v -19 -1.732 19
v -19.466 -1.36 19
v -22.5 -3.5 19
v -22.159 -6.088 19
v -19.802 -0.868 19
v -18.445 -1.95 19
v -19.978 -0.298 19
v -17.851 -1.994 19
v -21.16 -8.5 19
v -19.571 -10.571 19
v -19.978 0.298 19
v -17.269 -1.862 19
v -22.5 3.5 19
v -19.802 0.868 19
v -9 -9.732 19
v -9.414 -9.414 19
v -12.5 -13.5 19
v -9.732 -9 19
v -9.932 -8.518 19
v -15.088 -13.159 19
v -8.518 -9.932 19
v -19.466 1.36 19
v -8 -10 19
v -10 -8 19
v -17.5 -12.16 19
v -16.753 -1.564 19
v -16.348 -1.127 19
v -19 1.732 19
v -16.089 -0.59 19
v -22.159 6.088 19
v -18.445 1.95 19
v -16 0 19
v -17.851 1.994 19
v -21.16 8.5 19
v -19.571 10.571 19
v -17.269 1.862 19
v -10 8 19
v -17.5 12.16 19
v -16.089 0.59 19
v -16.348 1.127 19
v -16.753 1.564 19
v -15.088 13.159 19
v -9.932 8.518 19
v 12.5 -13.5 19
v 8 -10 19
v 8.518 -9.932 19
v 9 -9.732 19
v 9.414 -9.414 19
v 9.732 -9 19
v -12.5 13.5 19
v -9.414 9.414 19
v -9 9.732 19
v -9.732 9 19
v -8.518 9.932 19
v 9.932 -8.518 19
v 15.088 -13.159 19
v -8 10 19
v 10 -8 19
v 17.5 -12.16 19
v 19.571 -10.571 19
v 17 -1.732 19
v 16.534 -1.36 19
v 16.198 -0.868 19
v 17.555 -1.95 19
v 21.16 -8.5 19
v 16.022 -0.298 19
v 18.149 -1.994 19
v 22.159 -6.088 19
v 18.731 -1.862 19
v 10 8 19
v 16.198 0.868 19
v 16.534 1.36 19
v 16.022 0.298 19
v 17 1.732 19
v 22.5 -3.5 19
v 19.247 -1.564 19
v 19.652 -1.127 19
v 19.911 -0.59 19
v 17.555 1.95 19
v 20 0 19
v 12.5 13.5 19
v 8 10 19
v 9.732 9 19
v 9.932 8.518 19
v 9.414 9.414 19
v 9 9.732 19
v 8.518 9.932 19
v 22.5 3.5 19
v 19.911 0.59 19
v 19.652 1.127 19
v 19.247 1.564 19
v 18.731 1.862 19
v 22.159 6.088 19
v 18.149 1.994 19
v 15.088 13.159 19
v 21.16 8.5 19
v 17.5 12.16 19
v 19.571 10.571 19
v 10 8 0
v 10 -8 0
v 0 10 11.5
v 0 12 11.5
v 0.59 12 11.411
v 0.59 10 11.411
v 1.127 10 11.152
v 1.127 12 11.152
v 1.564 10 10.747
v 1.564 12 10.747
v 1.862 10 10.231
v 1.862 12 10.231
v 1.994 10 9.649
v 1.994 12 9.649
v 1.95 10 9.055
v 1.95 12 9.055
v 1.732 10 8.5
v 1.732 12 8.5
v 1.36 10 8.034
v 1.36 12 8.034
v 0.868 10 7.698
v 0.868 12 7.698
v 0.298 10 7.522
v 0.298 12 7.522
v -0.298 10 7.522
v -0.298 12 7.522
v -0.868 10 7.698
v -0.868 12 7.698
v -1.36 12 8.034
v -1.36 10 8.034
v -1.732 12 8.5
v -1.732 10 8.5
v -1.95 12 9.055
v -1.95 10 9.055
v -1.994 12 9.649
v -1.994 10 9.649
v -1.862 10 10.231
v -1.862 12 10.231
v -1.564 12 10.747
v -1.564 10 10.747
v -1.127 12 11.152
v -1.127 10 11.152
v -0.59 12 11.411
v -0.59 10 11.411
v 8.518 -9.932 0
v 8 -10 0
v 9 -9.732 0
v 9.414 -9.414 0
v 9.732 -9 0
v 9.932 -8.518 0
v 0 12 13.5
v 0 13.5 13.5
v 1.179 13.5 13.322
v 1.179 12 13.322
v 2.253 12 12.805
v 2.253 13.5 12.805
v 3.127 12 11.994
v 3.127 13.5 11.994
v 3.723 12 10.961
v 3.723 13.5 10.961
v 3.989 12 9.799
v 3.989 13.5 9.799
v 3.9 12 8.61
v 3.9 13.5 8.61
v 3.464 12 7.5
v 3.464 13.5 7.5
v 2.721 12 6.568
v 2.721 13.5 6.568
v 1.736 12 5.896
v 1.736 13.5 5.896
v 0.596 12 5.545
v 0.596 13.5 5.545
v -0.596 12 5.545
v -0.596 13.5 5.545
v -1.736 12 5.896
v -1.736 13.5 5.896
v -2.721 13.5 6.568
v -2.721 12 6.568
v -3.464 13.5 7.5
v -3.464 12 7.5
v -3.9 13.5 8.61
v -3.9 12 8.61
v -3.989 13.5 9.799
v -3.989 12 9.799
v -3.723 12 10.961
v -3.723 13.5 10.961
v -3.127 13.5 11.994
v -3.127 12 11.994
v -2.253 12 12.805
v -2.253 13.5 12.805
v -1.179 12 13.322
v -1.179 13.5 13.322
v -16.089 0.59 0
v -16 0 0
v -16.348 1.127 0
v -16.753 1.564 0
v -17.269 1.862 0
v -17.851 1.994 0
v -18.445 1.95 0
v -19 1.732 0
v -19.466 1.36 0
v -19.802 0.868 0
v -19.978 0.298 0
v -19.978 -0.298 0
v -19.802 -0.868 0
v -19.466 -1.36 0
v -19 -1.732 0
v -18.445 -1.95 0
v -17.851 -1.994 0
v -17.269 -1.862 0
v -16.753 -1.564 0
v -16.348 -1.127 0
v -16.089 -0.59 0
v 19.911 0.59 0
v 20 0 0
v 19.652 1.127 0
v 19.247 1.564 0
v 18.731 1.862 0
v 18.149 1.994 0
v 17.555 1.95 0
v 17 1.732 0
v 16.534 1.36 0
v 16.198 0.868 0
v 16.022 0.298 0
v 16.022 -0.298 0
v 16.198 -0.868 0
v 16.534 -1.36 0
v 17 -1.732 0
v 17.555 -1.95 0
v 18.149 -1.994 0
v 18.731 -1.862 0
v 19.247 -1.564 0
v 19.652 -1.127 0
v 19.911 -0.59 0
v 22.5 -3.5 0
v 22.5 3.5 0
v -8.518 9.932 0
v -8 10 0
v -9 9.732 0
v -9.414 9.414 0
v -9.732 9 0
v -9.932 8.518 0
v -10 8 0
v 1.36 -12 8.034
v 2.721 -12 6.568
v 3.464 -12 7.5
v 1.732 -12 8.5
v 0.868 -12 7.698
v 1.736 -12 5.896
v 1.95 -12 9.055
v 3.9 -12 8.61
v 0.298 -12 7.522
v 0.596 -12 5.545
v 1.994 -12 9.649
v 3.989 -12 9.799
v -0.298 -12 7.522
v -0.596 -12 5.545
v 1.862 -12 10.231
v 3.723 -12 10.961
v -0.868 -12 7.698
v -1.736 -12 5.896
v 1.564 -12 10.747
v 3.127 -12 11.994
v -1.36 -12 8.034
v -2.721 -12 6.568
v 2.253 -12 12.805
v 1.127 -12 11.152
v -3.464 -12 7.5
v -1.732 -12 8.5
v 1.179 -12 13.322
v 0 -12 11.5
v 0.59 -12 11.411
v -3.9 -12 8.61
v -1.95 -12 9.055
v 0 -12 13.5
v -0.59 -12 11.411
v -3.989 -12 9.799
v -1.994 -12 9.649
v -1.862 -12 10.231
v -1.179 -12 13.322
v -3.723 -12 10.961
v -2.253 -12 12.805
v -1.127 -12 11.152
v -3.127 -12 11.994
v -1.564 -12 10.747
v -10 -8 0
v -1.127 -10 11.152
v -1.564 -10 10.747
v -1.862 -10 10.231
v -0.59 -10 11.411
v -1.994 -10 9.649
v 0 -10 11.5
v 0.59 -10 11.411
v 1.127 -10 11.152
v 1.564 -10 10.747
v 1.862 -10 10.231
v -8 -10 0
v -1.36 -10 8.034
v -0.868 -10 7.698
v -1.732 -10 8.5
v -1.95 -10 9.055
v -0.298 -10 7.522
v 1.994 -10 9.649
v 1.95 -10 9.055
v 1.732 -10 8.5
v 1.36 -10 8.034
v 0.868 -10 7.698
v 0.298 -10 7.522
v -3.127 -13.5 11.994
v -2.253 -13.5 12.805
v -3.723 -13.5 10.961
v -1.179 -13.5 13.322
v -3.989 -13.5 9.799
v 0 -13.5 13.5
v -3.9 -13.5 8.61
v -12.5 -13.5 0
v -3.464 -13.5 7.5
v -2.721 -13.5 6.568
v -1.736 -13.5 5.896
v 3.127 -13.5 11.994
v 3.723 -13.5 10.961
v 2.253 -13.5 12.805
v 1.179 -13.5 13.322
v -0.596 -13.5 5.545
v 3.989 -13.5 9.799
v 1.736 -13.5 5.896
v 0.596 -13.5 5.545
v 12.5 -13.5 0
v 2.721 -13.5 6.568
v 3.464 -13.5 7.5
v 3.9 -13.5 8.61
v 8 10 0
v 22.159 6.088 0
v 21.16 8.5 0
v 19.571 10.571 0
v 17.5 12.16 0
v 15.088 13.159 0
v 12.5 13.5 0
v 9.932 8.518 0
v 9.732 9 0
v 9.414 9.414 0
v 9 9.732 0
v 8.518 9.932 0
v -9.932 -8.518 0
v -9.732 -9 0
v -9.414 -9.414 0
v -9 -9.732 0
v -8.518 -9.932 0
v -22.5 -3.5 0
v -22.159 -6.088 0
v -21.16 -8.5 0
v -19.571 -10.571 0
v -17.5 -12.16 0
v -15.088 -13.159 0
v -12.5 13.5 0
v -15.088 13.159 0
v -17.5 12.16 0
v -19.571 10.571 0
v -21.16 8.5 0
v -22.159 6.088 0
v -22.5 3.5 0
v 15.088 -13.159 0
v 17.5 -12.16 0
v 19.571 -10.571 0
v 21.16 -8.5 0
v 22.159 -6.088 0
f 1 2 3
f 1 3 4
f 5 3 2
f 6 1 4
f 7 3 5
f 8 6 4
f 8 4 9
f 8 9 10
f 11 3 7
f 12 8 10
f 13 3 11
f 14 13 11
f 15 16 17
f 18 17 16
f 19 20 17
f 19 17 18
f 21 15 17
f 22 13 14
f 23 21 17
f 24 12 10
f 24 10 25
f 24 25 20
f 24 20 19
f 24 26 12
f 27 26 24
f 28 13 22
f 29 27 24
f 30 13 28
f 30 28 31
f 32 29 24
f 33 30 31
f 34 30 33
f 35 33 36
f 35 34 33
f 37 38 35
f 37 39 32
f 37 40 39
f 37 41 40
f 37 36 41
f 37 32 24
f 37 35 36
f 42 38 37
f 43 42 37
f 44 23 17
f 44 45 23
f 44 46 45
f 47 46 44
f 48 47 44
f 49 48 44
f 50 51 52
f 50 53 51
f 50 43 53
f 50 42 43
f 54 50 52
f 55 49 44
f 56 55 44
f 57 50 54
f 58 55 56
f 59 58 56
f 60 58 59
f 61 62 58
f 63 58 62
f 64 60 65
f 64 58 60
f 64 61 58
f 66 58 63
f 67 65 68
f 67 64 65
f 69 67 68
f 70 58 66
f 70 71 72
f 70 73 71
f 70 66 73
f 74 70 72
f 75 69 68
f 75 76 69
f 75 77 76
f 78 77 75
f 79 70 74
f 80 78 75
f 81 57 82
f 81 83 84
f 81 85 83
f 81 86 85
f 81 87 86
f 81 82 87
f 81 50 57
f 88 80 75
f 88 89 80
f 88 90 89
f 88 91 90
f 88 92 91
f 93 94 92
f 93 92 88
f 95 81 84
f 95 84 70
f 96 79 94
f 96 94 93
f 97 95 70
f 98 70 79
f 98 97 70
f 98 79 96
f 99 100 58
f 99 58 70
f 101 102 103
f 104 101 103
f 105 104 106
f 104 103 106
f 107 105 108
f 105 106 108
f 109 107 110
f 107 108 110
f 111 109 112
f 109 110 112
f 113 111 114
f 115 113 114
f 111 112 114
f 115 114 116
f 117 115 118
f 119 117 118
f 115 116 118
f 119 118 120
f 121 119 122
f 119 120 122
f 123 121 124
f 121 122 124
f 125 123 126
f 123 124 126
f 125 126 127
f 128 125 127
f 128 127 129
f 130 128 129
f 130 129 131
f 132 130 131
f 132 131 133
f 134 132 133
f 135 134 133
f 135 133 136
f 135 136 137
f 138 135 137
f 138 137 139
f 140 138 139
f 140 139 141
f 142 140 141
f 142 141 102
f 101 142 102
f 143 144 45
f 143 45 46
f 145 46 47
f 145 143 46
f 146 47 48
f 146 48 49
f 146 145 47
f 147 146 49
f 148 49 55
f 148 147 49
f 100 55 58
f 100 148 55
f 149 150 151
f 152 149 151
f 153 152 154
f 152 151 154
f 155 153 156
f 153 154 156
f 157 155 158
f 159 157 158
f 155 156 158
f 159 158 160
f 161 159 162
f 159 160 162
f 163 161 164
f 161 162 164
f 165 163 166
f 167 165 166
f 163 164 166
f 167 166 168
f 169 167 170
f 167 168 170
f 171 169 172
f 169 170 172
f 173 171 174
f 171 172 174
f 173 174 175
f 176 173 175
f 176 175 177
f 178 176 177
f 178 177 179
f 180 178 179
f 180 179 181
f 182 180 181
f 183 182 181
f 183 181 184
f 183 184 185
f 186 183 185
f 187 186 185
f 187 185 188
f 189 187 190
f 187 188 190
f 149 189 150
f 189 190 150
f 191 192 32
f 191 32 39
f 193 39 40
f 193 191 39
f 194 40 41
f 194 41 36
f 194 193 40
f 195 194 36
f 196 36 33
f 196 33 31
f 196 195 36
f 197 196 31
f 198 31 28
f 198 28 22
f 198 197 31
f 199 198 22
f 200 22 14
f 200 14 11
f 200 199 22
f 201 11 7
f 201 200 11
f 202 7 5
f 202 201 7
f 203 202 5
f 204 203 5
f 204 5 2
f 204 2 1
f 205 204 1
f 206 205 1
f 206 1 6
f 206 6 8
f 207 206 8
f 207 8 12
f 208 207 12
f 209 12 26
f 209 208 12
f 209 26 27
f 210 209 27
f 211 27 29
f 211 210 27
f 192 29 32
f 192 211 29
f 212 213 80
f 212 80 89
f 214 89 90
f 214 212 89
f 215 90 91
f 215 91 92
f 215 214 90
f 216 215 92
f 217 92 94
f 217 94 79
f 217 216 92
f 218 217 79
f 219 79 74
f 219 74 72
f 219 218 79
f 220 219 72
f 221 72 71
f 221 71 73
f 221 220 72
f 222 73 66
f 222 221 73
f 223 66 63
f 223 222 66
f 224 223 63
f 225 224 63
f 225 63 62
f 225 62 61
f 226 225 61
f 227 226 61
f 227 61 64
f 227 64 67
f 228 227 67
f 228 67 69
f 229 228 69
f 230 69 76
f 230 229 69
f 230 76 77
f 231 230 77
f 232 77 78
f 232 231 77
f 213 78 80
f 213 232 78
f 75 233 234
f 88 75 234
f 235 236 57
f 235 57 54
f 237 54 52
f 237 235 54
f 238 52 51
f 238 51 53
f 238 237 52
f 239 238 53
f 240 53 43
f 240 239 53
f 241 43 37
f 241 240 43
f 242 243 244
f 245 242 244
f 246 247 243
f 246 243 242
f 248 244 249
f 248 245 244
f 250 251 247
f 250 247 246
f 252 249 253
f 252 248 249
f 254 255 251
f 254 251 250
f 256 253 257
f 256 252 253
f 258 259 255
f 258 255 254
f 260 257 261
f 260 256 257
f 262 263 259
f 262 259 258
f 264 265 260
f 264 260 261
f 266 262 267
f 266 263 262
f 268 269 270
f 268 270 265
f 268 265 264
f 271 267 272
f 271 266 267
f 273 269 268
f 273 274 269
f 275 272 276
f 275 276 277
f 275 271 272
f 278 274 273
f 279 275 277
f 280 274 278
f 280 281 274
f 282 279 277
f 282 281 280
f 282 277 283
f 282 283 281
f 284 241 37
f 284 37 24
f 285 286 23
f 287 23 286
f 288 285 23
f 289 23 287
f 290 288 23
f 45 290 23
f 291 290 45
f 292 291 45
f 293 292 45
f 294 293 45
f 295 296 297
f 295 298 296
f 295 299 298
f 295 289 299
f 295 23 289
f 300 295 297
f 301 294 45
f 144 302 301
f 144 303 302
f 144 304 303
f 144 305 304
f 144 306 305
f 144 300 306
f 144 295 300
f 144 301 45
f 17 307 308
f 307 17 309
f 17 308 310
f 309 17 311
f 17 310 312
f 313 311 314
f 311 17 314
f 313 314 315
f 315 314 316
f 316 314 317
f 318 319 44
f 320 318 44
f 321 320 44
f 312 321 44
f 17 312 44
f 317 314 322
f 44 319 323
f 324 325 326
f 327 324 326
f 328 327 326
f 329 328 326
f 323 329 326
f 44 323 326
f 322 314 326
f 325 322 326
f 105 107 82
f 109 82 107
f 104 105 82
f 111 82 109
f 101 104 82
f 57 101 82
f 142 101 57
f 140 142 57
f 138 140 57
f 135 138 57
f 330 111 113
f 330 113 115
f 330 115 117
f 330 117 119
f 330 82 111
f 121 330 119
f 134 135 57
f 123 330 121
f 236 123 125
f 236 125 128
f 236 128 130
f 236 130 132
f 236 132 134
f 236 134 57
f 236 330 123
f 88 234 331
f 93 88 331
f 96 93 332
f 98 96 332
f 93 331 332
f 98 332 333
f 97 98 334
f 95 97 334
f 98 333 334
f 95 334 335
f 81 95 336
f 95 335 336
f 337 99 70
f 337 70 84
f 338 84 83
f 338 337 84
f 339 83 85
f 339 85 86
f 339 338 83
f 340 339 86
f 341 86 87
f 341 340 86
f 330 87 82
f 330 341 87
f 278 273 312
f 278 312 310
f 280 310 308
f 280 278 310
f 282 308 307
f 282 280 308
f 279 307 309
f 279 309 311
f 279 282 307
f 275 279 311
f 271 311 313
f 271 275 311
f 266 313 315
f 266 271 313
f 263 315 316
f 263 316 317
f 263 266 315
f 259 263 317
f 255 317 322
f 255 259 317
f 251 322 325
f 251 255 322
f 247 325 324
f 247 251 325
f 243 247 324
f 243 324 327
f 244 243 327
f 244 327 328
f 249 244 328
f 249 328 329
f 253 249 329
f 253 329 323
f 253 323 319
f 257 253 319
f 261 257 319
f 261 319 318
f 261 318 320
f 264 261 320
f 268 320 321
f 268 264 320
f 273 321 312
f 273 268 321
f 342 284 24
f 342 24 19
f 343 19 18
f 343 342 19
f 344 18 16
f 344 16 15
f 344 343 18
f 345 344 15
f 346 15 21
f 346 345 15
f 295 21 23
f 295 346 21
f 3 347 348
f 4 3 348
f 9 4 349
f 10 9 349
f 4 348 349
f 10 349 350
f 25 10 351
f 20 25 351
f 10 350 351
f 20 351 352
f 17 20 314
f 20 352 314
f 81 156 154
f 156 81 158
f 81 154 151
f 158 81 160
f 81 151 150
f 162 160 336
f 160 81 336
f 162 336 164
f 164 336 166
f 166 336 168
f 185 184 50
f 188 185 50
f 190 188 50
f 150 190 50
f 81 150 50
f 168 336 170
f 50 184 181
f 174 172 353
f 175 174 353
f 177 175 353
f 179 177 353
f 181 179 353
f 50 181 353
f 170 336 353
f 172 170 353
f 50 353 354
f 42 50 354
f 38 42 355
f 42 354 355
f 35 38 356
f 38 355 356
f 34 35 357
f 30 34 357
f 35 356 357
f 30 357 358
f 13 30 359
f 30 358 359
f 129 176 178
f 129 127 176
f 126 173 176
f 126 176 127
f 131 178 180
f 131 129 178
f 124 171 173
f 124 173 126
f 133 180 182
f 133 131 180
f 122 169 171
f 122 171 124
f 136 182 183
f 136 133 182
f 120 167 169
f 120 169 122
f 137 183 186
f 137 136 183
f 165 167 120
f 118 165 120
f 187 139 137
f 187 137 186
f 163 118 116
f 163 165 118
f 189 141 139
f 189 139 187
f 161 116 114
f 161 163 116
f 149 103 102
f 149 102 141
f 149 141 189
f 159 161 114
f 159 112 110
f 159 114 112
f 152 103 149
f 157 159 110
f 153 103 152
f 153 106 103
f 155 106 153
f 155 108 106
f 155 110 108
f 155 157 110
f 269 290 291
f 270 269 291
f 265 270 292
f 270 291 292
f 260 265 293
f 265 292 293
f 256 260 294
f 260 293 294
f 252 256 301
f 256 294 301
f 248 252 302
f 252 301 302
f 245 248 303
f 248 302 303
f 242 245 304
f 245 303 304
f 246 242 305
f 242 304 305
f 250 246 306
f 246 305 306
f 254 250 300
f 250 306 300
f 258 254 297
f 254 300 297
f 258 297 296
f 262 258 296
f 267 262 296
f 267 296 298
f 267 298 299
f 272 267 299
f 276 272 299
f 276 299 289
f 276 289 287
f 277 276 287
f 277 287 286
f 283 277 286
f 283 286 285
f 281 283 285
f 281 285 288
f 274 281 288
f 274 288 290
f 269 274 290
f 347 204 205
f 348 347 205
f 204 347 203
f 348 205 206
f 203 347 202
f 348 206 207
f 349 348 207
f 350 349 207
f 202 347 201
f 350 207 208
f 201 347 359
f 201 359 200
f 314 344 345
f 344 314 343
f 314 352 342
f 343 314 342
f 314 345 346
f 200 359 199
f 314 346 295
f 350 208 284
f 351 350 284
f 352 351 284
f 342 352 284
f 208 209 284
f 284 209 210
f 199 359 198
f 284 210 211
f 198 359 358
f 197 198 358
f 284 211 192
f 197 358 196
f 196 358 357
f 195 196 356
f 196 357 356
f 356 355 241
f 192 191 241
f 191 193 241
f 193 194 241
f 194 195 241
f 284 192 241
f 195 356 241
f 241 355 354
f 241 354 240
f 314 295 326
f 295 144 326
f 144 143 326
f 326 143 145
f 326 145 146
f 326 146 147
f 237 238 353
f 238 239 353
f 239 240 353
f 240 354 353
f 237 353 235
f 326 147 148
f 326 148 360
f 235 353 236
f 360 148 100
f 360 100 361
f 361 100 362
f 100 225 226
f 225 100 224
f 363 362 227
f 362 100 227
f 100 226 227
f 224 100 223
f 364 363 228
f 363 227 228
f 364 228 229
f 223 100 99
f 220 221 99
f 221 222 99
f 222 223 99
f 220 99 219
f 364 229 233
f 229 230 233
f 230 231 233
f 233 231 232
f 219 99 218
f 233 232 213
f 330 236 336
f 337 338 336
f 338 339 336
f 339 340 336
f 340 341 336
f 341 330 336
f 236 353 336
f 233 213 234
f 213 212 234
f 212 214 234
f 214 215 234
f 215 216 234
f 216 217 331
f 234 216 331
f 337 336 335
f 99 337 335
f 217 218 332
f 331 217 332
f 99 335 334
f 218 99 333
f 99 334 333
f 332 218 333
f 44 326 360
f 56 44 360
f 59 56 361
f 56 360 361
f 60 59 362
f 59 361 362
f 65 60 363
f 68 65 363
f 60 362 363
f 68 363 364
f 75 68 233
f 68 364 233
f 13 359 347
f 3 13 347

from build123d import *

# Parameters (mm, degrees)
SKETCH1_R           = 2
BOSS_EXTRUDE1_DEPTH = 19
SKETCH3_R           = 2
CUT_EXTRUDE2_DEPTH  = 40.953097502
SKETCH4_R           = 4
CUT_EXTRUDE3_DEPTH  = 1.5
CUT_EXTRUDE4_START  = -1.5
SKETCH5_R           = 4
CUT_EXTRUDE4_DEPTH  = 1.5


with BuildPart() as part:
    # Sketch1 → Boss-Extrude1 (new body)
    with BuildSketch(Plane.XY):
        with BuildLine():
            Line((-12.5, -13.5), (12.5, -13.5))
            ThreePointArc((12.5, -13.5), (19.571067812, -10.571067812), (22.5, -3.5))
            Line((22.5, -3.5), (22.5, 3.5))
            ThreePointArc((22.5, 3.5), (19.571067812, 10.571067812), (12.5, 13.5))
            Line((12.5, 13.5), (-12.5, 13.5))
            ThreePointArc((-12.5, 13.5), (-19.571067812, 10.571067812), (-22.5, 3.5))
            Line((-22.5, 3.5), (-22.5, -3.5))
            ThreePointArc((-22.5, -3.5), (-19.571067812, -10.571067812), (-12.5, -13.5))
        make_face()
        with Locations((-18, 0)):
            Circle(SKETCH1_R, mode=Mode.SUBTRACT)
        with Locations((18, 0)):
            Circle(SKETCH1_R, mode=Mode.SUBTRACT)
        with BuildLine():
            Line((-8, -10), (8, -10))
            ThreePointArc((8, -10), (9.414213562, -9.414213562), (10, -8))
            Line((10, -8), (10, 8))
            ThreePointArc((10, 8), (9.414213562, 9.414213562), (8, 10))
            Line((8, 10), (-8, 10))
            ThreePointArc((-8, 10), (-9.414213562, 9.414213562), (-10, 8))
            Line((-10, 8), (-10, -8))
            ThreePointArc((-10, -8), (-9.414213562, -9.414213562), (-8, -10))
        make_face(mode=Mode.SUBTRACT)
    extrude(amount=BOSS_EXTRUDE1_DEPTH)

    # Sketch3 → Cut-Extrude2 (cut, through all)
    with BuildSketch(Plane(origin=(0, 13.5, 0), x_dir=(1, 0, 0), z_dir=(0, 1, 0))):
        with Locations(Location((0, -9.5, 0), (0, 0, 270))):
            Circle(SKETCH3_R)
    extrude(amount=-CUT_EXTRUDE2_DEPTH, mode=Mode.SUBTRACT)

    # Sketch4 → Cut-Extrude3 (cut)
    with BuildSketch(Plane(origin=(0, 13.5, 0), x_dir=(1, 0, 0), z_dir=(0, 1, 0))):
        with Locations(Location((0, -9.5, 0), (0, 0, 270))):
            Circle(SKETCH4_R)
    extrude(amount=-CUT_EXTRUDE3_DEPTH, mode=Mode.SUBTRACT)

    # Sketch5 → Cut-Extrude4 (cut)
    with BuildSketch(Plane.XZ.offset(13.5).offset(CUT_EXTRUDE4_START)):
        with Locations(Location((0, 9.5, 0), (0, 0, 90))):
            Circle(SKETCH5_R)
    extrude(amount=CUT_EXTRUDE4_DEPTH, mode=Mode.SUBTRACT)


solid = part.part
